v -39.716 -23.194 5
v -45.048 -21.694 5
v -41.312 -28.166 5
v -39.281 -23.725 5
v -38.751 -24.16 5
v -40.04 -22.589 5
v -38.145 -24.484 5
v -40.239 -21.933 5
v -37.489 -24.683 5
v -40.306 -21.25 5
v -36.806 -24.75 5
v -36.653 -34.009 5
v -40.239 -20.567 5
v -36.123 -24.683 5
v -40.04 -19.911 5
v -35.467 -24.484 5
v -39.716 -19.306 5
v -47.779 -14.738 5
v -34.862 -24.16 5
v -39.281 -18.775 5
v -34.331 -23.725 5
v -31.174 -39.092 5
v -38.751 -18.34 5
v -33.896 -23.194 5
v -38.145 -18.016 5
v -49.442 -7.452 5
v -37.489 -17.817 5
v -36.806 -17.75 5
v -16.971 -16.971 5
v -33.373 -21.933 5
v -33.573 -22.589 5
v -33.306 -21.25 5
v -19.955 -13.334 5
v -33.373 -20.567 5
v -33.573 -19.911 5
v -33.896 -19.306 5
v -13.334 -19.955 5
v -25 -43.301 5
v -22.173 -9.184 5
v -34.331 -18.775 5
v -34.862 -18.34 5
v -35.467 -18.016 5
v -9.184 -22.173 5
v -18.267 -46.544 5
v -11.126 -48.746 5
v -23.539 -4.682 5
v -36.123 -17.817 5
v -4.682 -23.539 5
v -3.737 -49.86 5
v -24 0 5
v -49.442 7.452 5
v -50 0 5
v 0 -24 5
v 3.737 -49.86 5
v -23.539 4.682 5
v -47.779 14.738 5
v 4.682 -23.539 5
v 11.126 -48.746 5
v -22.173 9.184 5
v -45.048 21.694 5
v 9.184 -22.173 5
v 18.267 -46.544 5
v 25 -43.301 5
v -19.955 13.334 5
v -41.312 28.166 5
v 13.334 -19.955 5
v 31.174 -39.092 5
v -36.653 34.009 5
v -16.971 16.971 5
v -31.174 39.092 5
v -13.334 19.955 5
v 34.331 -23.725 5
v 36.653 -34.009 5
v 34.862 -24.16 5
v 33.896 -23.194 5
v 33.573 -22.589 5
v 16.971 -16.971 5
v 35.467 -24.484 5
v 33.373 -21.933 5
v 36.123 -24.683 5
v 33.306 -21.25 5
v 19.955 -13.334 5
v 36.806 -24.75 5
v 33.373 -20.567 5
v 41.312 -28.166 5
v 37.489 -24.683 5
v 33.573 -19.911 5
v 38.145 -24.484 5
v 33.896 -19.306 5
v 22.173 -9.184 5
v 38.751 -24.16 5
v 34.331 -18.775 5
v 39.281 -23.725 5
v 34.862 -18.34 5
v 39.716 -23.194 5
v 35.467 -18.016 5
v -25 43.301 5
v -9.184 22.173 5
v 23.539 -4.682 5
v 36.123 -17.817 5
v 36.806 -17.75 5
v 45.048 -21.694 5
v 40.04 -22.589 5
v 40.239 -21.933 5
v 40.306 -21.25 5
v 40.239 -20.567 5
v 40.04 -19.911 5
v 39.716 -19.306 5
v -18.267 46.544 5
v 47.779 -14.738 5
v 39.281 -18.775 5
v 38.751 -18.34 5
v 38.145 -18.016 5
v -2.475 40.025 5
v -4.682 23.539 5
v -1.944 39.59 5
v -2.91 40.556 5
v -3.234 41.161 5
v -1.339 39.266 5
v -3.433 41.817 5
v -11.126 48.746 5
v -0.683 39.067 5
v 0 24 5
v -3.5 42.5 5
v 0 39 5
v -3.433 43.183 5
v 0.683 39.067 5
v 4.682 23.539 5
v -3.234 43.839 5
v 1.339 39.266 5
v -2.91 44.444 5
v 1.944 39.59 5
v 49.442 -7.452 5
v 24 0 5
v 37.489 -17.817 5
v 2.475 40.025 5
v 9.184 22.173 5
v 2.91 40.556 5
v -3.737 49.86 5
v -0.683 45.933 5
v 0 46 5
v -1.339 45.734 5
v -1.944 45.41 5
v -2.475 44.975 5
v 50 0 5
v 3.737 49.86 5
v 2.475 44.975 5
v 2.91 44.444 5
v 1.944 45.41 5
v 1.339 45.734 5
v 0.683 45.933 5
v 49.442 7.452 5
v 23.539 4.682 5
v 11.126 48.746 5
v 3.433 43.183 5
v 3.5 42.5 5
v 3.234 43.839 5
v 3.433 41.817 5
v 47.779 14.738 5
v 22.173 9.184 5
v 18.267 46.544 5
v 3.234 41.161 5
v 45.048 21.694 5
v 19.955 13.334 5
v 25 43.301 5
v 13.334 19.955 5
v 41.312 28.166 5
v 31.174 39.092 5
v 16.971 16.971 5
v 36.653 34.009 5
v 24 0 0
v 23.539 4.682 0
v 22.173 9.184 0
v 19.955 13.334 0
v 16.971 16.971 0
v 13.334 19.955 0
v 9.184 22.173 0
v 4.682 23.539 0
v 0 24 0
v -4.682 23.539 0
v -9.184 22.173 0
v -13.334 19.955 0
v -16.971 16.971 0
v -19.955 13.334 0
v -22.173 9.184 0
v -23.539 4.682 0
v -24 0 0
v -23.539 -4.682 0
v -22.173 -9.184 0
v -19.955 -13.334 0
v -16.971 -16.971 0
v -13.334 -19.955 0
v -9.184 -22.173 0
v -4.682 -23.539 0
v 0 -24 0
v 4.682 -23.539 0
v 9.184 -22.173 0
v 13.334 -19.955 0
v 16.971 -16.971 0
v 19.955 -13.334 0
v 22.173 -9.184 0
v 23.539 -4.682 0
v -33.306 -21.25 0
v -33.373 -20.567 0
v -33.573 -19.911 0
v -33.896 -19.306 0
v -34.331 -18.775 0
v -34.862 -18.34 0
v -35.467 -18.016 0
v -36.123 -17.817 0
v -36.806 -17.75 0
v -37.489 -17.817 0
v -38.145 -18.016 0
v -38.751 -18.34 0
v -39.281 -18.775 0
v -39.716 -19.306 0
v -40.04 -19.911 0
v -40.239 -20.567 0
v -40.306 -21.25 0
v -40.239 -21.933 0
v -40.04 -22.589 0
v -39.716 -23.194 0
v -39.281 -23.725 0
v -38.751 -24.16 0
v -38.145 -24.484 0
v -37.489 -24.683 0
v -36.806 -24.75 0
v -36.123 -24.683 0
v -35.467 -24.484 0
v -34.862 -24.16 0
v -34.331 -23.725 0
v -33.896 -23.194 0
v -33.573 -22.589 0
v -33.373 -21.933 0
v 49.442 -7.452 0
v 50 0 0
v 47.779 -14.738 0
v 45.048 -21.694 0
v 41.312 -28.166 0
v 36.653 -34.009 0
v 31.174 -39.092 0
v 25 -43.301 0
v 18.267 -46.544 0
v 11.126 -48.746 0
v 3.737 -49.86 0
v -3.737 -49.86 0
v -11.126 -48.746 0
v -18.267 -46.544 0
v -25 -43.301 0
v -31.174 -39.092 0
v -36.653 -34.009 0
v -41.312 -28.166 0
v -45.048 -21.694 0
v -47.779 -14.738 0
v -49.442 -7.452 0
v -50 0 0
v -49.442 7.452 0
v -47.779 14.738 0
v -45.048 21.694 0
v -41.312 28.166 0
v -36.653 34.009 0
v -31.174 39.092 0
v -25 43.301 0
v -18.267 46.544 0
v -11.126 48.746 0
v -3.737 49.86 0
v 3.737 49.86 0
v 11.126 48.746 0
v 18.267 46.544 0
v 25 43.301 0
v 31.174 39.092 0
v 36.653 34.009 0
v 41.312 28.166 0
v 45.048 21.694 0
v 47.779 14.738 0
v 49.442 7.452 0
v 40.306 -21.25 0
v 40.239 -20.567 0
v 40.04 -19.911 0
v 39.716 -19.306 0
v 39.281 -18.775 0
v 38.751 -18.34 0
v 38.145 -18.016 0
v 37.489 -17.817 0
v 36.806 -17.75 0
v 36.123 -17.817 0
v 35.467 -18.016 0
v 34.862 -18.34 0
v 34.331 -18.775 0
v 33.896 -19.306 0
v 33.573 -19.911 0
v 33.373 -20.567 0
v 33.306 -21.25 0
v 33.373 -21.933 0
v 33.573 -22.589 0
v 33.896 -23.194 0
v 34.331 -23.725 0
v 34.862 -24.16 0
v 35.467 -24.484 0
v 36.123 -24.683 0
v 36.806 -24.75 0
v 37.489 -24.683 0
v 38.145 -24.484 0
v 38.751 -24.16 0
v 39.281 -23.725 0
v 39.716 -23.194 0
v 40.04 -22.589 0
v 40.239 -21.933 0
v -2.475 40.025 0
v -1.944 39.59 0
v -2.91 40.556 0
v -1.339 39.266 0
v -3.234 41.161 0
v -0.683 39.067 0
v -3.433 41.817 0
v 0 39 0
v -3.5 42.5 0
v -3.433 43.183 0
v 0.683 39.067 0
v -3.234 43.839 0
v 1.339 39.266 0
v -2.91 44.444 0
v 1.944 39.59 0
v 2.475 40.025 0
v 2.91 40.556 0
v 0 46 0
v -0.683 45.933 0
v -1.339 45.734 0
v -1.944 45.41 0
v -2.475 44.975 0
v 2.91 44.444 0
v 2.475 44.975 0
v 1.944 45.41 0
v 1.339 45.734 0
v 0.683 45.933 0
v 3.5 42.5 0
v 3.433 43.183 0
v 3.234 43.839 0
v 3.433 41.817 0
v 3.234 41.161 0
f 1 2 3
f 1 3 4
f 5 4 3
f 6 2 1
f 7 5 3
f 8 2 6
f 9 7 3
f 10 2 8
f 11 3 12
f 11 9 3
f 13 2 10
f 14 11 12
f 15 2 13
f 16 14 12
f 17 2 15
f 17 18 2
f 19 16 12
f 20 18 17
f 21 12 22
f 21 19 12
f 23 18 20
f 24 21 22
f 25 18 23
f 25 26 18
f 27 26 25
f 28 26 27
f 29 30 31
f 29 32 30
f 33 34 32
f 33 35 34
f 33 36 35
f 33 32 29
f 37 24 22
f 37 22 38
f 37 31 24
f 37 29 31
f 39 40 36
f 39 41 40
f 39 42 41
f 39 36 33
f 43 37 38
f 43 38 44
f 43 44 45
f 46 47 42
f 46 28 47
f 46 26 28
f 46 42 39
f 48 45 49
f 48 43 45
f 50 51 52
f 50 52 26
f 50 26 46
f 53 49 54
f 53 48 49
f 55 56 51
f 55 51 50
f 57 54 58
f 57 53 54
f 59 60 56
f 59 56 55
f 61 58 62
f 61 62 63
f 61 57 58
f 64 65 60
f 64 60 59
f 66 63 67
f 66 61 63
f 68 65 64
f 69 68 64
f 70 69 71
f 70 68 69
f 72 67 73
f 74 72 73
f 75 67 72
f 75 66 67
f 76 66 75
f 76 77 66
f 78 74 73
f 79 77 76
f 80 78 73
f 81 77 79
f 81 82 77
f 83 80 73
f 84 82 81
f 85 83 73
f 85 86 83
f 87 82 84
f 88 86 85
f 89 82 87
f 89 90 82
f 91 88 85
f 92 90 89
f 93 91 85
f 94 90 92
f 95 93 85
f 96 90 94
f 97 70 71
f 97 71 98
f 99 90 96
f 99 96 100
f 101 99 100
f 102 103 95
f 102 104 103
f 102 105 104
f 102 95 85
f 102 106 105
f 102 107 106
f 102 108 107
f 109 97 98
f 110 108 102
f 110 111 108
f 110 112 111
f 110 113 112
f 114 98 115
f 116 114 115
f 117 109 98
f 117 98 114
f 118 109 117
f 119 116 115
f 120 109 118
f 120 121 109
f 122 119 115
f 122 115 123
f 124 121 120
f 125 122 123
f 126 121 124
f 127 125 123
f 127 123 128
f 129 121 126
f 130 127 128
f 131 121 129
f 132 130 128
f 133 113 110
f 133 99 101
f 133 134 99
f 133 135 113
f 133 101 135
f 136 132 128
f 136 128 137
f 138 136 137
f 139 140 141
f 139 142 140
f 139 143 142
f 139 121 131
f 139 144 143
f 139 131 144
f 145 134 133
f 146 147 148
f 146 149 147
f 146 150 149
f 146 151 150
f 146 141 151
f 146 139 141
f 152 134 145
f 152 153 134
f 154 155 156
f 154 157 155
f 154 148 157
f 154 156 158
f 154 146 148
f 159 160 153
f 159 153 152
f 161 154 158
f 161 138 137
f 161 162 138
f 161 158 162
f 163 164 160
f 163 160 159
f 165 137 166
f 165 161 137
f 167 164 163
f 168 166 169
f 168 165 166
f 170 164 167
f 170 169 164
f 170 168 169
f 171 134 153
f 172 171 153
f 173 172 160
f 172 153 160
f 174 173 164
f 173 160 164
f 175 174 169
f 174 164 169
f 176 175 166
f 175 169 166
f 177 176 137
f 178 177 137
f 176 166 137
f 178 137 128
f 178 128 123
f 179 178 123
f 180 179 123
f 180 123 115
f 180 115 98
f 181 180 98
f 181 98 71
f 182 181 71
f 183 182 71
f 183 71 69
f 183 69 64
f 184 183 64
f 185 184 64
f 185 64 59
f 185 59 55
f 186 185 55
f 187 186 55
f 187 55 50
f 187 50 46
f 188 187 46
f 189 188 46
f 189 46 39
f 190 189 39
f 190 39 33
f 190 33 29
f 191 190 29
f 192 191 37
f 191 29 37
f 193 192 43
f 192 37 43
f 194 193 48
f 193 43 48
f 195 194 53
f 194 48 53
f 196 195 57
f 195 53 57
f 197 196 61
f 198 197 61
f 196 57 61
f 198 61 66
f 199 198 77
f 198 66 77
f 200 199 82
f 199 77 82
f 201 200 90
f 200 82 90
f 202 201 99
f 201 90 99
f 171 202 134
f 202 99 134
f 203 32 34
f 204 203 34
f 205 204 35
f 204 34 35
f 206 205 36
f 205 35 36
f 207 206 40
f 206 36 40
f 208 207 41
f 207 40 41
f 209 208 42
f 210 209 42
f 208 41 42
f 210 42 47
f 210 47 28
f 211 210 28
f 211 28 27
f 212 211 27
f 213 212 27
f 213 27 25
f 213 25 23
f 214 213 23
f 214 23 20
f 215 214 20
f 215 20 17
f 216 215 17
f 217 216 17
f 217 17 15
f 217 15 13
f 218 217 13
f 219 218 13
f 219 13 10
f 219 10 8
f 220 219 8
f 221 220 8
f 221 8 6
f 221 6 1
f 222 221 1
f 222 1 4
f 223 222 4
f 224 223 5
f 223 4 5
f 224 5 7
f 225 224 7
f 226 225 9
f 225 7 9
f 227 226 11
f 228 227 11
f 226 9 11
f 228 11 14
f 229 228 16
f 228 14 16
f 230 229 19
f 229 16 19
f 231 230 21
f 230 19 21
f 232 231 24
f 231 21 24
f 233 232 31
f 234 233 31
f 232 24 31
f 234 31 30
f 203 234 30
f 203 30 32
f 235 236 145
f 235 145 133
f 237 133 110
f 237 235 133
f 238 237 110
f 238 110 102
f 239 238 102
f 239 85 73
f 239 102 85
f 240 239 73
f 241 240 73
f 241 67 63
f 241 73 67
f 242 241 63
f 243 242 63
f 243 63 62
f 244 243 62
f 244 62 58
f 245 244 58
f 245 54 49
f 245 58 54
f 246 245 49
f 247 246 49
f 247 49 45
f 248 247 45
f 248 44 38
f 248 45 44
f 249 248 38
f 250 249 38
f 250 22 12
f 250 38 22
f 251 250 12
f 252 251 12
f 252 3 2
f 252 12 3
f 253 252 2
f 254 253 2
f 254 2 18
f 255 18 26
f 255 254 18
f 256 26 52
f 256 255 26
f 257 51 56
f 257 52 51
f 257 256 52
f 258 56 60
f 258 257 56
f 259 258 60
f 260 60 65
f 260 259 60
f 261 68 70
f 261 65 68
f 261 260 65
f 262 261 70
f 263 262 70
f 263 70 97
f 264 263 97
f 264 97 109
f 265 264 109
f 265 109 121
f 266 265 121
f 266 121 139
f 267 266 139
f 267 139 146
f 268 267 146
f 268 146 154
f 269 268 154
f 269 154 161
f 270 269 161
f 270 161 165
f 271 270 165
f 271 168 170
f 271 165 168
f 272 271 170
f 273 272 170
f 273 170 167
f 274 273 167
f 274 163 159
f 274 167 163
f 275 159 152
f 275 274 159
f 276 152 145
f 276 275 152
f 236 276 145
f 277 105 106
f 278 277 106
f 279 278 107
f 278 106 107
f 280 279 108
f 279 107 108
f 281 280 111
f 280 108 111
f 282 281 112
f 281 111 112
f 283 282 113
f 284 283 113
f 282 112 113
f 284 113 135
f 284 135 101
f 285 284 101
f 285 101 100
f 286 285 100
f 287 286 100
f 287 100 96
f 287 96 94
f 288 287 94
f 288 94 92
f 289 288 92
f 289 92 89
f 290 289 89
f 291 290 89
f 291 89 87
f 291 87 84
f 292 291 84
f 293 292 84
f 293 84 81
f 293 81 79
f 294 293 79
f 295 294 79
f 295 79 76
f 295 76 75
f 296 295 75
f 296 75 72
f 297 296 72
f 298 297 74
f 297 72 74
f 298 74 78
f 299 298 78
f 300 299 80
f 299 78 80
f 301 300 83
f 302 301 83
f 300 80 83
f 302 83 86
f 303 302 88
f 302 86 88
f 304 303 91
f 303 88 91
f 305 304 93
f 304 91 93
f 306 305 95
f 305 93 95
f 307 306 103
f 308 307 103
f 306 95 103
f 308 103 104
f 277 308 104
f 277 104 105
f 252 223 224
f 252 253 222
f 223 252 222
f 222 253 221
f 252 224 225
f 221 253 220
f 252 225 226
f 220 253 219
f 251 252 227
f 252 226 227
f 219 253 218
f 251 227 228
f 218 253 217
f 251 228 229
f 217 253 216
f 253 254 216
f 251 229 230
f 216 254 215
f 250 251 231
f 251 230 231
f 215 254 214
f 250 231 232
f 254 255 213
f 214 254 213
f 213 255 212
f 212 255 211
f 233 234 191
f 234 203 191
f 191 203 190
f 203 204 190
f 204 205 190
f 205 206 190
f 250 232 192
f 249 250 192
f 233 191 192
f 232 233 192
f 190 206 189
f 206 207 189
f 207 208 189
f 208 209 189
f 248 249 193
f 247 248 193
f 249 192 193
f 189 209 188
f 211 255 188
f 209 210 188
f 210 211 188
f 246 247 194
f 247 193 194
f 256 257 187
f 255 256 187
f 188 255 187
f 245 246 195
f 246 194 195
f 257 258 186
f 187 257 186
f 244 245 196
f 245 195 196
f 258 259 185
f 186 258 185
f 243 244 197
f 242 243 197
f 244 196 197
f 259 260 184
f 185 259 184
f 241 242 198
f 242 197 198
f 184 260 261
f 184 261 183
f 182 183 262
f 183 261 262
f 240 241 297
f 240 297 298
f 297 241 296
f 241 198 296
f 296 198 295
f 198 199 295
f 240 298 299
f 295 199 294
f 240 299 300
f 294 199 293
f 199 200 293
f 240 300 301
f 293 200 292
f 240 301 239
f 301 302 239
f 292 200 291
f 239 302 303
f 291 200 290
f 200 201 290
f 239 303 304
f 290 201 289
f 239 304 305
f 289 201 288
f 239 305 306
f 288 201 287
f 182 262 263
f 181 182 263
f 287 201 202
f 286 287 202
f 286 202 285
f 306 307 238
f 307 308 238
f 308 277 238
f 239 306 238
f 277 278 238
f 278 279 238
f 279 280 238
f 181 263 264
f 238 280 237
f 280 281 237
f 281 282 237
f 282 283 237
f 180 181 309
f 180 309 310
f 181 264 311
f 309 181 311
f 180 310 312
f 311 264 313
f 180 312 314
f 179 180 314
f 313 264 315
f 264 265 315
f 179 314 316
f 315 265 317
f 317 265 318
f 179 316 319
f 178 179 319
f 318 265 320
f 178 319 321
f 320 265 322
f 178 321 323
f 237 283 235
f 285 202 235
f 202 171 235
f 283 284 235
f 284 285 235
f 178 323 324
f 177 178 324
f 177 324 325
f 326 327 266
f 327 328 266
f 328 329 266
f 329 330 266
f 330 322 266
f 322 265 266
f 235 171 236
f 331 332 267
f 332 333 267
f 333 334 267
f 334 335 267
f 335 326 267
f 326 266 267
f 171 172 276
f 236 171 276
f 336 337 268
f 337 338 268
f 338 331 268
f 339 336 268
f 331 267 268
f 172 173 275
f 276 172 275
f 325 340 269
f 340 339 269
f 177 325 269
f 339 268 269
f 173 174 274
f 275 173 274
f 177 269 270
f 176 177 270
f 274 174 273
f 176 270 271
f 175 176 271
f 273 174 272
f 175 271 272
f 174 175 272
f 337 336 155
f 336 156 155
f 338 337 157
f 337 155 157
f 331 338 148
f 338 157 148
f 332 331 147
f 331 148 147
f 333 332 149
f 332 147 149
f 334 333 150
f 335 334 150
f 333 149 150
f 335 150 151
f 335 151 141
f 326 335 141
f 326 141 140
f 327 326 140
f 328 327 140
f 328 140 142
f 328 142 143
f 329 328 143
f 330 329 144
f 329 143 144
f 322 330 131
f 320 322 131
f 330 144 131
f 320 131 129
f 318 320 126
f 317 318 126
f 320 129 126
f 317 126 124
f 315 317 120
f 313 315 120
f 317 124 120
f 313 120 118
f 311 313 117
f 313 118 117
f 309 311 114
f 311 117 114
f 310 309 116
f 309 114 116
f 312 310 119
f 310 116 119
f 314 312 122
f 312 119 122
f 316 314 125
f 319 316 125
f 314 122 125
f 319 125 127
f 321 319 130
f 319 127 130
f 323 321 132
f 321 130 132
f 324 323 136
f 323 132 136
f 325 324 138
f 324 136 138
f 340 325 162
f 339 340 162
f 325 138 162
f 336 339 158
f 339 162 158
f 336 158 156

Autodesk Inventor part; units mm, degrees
ref_plane "YZ Plane" through (0, 0, 0) normal (1, 0, 0) x (0, 1, 0)
ref_plane "XZ Plane" through (0, 0, 0) normal (0, 1, 0) x (-1, 0, 0)
ref_plane "XY Plane" through (0, 0, 0) normal (0, 0, 1) x (1, 0, 0)
sketch "Sketch1" plane through (0, 0, 0) normal (0, 0, 1) x (1, 0, 0)
  circle A0 centre (0, 0) radius 50
  dimension "d0" = 100
extrude "Extrusion1" add sketch "Sketch1" along normal blind 5
sketch "Sketch2" plane through (0, 0, 5) normal (0, 0, 1) x (1, 0, 0)
  circle A0 centre (0, 0) radius 24
  dimension "d3" = 48
extrude "Extrusion2" cut sketch "Sketch2" against normal blind 5
sketch "Sketch3" plane through (0, 0, 5) normal (0, 0, 1) x (1, 0, 0)
  circle A0 centre (0, 42.5) radius 3.5
  circle A1 centre (0, 0) radius 50 projected
  circle A2 centre (-36.8061, -21.25) radius 3.5
  circle A3 centre (36.8061, -21.25) radius 3.5
  dimension "d6" = 7
  dimension "d8" = 4
  dimension "d11" = 360
extrude "Extrusion3" cut sketch "Sketch3" against normal blind 5 contours A0 | A2 | A3
properties part number "blacha pod odciągi"
